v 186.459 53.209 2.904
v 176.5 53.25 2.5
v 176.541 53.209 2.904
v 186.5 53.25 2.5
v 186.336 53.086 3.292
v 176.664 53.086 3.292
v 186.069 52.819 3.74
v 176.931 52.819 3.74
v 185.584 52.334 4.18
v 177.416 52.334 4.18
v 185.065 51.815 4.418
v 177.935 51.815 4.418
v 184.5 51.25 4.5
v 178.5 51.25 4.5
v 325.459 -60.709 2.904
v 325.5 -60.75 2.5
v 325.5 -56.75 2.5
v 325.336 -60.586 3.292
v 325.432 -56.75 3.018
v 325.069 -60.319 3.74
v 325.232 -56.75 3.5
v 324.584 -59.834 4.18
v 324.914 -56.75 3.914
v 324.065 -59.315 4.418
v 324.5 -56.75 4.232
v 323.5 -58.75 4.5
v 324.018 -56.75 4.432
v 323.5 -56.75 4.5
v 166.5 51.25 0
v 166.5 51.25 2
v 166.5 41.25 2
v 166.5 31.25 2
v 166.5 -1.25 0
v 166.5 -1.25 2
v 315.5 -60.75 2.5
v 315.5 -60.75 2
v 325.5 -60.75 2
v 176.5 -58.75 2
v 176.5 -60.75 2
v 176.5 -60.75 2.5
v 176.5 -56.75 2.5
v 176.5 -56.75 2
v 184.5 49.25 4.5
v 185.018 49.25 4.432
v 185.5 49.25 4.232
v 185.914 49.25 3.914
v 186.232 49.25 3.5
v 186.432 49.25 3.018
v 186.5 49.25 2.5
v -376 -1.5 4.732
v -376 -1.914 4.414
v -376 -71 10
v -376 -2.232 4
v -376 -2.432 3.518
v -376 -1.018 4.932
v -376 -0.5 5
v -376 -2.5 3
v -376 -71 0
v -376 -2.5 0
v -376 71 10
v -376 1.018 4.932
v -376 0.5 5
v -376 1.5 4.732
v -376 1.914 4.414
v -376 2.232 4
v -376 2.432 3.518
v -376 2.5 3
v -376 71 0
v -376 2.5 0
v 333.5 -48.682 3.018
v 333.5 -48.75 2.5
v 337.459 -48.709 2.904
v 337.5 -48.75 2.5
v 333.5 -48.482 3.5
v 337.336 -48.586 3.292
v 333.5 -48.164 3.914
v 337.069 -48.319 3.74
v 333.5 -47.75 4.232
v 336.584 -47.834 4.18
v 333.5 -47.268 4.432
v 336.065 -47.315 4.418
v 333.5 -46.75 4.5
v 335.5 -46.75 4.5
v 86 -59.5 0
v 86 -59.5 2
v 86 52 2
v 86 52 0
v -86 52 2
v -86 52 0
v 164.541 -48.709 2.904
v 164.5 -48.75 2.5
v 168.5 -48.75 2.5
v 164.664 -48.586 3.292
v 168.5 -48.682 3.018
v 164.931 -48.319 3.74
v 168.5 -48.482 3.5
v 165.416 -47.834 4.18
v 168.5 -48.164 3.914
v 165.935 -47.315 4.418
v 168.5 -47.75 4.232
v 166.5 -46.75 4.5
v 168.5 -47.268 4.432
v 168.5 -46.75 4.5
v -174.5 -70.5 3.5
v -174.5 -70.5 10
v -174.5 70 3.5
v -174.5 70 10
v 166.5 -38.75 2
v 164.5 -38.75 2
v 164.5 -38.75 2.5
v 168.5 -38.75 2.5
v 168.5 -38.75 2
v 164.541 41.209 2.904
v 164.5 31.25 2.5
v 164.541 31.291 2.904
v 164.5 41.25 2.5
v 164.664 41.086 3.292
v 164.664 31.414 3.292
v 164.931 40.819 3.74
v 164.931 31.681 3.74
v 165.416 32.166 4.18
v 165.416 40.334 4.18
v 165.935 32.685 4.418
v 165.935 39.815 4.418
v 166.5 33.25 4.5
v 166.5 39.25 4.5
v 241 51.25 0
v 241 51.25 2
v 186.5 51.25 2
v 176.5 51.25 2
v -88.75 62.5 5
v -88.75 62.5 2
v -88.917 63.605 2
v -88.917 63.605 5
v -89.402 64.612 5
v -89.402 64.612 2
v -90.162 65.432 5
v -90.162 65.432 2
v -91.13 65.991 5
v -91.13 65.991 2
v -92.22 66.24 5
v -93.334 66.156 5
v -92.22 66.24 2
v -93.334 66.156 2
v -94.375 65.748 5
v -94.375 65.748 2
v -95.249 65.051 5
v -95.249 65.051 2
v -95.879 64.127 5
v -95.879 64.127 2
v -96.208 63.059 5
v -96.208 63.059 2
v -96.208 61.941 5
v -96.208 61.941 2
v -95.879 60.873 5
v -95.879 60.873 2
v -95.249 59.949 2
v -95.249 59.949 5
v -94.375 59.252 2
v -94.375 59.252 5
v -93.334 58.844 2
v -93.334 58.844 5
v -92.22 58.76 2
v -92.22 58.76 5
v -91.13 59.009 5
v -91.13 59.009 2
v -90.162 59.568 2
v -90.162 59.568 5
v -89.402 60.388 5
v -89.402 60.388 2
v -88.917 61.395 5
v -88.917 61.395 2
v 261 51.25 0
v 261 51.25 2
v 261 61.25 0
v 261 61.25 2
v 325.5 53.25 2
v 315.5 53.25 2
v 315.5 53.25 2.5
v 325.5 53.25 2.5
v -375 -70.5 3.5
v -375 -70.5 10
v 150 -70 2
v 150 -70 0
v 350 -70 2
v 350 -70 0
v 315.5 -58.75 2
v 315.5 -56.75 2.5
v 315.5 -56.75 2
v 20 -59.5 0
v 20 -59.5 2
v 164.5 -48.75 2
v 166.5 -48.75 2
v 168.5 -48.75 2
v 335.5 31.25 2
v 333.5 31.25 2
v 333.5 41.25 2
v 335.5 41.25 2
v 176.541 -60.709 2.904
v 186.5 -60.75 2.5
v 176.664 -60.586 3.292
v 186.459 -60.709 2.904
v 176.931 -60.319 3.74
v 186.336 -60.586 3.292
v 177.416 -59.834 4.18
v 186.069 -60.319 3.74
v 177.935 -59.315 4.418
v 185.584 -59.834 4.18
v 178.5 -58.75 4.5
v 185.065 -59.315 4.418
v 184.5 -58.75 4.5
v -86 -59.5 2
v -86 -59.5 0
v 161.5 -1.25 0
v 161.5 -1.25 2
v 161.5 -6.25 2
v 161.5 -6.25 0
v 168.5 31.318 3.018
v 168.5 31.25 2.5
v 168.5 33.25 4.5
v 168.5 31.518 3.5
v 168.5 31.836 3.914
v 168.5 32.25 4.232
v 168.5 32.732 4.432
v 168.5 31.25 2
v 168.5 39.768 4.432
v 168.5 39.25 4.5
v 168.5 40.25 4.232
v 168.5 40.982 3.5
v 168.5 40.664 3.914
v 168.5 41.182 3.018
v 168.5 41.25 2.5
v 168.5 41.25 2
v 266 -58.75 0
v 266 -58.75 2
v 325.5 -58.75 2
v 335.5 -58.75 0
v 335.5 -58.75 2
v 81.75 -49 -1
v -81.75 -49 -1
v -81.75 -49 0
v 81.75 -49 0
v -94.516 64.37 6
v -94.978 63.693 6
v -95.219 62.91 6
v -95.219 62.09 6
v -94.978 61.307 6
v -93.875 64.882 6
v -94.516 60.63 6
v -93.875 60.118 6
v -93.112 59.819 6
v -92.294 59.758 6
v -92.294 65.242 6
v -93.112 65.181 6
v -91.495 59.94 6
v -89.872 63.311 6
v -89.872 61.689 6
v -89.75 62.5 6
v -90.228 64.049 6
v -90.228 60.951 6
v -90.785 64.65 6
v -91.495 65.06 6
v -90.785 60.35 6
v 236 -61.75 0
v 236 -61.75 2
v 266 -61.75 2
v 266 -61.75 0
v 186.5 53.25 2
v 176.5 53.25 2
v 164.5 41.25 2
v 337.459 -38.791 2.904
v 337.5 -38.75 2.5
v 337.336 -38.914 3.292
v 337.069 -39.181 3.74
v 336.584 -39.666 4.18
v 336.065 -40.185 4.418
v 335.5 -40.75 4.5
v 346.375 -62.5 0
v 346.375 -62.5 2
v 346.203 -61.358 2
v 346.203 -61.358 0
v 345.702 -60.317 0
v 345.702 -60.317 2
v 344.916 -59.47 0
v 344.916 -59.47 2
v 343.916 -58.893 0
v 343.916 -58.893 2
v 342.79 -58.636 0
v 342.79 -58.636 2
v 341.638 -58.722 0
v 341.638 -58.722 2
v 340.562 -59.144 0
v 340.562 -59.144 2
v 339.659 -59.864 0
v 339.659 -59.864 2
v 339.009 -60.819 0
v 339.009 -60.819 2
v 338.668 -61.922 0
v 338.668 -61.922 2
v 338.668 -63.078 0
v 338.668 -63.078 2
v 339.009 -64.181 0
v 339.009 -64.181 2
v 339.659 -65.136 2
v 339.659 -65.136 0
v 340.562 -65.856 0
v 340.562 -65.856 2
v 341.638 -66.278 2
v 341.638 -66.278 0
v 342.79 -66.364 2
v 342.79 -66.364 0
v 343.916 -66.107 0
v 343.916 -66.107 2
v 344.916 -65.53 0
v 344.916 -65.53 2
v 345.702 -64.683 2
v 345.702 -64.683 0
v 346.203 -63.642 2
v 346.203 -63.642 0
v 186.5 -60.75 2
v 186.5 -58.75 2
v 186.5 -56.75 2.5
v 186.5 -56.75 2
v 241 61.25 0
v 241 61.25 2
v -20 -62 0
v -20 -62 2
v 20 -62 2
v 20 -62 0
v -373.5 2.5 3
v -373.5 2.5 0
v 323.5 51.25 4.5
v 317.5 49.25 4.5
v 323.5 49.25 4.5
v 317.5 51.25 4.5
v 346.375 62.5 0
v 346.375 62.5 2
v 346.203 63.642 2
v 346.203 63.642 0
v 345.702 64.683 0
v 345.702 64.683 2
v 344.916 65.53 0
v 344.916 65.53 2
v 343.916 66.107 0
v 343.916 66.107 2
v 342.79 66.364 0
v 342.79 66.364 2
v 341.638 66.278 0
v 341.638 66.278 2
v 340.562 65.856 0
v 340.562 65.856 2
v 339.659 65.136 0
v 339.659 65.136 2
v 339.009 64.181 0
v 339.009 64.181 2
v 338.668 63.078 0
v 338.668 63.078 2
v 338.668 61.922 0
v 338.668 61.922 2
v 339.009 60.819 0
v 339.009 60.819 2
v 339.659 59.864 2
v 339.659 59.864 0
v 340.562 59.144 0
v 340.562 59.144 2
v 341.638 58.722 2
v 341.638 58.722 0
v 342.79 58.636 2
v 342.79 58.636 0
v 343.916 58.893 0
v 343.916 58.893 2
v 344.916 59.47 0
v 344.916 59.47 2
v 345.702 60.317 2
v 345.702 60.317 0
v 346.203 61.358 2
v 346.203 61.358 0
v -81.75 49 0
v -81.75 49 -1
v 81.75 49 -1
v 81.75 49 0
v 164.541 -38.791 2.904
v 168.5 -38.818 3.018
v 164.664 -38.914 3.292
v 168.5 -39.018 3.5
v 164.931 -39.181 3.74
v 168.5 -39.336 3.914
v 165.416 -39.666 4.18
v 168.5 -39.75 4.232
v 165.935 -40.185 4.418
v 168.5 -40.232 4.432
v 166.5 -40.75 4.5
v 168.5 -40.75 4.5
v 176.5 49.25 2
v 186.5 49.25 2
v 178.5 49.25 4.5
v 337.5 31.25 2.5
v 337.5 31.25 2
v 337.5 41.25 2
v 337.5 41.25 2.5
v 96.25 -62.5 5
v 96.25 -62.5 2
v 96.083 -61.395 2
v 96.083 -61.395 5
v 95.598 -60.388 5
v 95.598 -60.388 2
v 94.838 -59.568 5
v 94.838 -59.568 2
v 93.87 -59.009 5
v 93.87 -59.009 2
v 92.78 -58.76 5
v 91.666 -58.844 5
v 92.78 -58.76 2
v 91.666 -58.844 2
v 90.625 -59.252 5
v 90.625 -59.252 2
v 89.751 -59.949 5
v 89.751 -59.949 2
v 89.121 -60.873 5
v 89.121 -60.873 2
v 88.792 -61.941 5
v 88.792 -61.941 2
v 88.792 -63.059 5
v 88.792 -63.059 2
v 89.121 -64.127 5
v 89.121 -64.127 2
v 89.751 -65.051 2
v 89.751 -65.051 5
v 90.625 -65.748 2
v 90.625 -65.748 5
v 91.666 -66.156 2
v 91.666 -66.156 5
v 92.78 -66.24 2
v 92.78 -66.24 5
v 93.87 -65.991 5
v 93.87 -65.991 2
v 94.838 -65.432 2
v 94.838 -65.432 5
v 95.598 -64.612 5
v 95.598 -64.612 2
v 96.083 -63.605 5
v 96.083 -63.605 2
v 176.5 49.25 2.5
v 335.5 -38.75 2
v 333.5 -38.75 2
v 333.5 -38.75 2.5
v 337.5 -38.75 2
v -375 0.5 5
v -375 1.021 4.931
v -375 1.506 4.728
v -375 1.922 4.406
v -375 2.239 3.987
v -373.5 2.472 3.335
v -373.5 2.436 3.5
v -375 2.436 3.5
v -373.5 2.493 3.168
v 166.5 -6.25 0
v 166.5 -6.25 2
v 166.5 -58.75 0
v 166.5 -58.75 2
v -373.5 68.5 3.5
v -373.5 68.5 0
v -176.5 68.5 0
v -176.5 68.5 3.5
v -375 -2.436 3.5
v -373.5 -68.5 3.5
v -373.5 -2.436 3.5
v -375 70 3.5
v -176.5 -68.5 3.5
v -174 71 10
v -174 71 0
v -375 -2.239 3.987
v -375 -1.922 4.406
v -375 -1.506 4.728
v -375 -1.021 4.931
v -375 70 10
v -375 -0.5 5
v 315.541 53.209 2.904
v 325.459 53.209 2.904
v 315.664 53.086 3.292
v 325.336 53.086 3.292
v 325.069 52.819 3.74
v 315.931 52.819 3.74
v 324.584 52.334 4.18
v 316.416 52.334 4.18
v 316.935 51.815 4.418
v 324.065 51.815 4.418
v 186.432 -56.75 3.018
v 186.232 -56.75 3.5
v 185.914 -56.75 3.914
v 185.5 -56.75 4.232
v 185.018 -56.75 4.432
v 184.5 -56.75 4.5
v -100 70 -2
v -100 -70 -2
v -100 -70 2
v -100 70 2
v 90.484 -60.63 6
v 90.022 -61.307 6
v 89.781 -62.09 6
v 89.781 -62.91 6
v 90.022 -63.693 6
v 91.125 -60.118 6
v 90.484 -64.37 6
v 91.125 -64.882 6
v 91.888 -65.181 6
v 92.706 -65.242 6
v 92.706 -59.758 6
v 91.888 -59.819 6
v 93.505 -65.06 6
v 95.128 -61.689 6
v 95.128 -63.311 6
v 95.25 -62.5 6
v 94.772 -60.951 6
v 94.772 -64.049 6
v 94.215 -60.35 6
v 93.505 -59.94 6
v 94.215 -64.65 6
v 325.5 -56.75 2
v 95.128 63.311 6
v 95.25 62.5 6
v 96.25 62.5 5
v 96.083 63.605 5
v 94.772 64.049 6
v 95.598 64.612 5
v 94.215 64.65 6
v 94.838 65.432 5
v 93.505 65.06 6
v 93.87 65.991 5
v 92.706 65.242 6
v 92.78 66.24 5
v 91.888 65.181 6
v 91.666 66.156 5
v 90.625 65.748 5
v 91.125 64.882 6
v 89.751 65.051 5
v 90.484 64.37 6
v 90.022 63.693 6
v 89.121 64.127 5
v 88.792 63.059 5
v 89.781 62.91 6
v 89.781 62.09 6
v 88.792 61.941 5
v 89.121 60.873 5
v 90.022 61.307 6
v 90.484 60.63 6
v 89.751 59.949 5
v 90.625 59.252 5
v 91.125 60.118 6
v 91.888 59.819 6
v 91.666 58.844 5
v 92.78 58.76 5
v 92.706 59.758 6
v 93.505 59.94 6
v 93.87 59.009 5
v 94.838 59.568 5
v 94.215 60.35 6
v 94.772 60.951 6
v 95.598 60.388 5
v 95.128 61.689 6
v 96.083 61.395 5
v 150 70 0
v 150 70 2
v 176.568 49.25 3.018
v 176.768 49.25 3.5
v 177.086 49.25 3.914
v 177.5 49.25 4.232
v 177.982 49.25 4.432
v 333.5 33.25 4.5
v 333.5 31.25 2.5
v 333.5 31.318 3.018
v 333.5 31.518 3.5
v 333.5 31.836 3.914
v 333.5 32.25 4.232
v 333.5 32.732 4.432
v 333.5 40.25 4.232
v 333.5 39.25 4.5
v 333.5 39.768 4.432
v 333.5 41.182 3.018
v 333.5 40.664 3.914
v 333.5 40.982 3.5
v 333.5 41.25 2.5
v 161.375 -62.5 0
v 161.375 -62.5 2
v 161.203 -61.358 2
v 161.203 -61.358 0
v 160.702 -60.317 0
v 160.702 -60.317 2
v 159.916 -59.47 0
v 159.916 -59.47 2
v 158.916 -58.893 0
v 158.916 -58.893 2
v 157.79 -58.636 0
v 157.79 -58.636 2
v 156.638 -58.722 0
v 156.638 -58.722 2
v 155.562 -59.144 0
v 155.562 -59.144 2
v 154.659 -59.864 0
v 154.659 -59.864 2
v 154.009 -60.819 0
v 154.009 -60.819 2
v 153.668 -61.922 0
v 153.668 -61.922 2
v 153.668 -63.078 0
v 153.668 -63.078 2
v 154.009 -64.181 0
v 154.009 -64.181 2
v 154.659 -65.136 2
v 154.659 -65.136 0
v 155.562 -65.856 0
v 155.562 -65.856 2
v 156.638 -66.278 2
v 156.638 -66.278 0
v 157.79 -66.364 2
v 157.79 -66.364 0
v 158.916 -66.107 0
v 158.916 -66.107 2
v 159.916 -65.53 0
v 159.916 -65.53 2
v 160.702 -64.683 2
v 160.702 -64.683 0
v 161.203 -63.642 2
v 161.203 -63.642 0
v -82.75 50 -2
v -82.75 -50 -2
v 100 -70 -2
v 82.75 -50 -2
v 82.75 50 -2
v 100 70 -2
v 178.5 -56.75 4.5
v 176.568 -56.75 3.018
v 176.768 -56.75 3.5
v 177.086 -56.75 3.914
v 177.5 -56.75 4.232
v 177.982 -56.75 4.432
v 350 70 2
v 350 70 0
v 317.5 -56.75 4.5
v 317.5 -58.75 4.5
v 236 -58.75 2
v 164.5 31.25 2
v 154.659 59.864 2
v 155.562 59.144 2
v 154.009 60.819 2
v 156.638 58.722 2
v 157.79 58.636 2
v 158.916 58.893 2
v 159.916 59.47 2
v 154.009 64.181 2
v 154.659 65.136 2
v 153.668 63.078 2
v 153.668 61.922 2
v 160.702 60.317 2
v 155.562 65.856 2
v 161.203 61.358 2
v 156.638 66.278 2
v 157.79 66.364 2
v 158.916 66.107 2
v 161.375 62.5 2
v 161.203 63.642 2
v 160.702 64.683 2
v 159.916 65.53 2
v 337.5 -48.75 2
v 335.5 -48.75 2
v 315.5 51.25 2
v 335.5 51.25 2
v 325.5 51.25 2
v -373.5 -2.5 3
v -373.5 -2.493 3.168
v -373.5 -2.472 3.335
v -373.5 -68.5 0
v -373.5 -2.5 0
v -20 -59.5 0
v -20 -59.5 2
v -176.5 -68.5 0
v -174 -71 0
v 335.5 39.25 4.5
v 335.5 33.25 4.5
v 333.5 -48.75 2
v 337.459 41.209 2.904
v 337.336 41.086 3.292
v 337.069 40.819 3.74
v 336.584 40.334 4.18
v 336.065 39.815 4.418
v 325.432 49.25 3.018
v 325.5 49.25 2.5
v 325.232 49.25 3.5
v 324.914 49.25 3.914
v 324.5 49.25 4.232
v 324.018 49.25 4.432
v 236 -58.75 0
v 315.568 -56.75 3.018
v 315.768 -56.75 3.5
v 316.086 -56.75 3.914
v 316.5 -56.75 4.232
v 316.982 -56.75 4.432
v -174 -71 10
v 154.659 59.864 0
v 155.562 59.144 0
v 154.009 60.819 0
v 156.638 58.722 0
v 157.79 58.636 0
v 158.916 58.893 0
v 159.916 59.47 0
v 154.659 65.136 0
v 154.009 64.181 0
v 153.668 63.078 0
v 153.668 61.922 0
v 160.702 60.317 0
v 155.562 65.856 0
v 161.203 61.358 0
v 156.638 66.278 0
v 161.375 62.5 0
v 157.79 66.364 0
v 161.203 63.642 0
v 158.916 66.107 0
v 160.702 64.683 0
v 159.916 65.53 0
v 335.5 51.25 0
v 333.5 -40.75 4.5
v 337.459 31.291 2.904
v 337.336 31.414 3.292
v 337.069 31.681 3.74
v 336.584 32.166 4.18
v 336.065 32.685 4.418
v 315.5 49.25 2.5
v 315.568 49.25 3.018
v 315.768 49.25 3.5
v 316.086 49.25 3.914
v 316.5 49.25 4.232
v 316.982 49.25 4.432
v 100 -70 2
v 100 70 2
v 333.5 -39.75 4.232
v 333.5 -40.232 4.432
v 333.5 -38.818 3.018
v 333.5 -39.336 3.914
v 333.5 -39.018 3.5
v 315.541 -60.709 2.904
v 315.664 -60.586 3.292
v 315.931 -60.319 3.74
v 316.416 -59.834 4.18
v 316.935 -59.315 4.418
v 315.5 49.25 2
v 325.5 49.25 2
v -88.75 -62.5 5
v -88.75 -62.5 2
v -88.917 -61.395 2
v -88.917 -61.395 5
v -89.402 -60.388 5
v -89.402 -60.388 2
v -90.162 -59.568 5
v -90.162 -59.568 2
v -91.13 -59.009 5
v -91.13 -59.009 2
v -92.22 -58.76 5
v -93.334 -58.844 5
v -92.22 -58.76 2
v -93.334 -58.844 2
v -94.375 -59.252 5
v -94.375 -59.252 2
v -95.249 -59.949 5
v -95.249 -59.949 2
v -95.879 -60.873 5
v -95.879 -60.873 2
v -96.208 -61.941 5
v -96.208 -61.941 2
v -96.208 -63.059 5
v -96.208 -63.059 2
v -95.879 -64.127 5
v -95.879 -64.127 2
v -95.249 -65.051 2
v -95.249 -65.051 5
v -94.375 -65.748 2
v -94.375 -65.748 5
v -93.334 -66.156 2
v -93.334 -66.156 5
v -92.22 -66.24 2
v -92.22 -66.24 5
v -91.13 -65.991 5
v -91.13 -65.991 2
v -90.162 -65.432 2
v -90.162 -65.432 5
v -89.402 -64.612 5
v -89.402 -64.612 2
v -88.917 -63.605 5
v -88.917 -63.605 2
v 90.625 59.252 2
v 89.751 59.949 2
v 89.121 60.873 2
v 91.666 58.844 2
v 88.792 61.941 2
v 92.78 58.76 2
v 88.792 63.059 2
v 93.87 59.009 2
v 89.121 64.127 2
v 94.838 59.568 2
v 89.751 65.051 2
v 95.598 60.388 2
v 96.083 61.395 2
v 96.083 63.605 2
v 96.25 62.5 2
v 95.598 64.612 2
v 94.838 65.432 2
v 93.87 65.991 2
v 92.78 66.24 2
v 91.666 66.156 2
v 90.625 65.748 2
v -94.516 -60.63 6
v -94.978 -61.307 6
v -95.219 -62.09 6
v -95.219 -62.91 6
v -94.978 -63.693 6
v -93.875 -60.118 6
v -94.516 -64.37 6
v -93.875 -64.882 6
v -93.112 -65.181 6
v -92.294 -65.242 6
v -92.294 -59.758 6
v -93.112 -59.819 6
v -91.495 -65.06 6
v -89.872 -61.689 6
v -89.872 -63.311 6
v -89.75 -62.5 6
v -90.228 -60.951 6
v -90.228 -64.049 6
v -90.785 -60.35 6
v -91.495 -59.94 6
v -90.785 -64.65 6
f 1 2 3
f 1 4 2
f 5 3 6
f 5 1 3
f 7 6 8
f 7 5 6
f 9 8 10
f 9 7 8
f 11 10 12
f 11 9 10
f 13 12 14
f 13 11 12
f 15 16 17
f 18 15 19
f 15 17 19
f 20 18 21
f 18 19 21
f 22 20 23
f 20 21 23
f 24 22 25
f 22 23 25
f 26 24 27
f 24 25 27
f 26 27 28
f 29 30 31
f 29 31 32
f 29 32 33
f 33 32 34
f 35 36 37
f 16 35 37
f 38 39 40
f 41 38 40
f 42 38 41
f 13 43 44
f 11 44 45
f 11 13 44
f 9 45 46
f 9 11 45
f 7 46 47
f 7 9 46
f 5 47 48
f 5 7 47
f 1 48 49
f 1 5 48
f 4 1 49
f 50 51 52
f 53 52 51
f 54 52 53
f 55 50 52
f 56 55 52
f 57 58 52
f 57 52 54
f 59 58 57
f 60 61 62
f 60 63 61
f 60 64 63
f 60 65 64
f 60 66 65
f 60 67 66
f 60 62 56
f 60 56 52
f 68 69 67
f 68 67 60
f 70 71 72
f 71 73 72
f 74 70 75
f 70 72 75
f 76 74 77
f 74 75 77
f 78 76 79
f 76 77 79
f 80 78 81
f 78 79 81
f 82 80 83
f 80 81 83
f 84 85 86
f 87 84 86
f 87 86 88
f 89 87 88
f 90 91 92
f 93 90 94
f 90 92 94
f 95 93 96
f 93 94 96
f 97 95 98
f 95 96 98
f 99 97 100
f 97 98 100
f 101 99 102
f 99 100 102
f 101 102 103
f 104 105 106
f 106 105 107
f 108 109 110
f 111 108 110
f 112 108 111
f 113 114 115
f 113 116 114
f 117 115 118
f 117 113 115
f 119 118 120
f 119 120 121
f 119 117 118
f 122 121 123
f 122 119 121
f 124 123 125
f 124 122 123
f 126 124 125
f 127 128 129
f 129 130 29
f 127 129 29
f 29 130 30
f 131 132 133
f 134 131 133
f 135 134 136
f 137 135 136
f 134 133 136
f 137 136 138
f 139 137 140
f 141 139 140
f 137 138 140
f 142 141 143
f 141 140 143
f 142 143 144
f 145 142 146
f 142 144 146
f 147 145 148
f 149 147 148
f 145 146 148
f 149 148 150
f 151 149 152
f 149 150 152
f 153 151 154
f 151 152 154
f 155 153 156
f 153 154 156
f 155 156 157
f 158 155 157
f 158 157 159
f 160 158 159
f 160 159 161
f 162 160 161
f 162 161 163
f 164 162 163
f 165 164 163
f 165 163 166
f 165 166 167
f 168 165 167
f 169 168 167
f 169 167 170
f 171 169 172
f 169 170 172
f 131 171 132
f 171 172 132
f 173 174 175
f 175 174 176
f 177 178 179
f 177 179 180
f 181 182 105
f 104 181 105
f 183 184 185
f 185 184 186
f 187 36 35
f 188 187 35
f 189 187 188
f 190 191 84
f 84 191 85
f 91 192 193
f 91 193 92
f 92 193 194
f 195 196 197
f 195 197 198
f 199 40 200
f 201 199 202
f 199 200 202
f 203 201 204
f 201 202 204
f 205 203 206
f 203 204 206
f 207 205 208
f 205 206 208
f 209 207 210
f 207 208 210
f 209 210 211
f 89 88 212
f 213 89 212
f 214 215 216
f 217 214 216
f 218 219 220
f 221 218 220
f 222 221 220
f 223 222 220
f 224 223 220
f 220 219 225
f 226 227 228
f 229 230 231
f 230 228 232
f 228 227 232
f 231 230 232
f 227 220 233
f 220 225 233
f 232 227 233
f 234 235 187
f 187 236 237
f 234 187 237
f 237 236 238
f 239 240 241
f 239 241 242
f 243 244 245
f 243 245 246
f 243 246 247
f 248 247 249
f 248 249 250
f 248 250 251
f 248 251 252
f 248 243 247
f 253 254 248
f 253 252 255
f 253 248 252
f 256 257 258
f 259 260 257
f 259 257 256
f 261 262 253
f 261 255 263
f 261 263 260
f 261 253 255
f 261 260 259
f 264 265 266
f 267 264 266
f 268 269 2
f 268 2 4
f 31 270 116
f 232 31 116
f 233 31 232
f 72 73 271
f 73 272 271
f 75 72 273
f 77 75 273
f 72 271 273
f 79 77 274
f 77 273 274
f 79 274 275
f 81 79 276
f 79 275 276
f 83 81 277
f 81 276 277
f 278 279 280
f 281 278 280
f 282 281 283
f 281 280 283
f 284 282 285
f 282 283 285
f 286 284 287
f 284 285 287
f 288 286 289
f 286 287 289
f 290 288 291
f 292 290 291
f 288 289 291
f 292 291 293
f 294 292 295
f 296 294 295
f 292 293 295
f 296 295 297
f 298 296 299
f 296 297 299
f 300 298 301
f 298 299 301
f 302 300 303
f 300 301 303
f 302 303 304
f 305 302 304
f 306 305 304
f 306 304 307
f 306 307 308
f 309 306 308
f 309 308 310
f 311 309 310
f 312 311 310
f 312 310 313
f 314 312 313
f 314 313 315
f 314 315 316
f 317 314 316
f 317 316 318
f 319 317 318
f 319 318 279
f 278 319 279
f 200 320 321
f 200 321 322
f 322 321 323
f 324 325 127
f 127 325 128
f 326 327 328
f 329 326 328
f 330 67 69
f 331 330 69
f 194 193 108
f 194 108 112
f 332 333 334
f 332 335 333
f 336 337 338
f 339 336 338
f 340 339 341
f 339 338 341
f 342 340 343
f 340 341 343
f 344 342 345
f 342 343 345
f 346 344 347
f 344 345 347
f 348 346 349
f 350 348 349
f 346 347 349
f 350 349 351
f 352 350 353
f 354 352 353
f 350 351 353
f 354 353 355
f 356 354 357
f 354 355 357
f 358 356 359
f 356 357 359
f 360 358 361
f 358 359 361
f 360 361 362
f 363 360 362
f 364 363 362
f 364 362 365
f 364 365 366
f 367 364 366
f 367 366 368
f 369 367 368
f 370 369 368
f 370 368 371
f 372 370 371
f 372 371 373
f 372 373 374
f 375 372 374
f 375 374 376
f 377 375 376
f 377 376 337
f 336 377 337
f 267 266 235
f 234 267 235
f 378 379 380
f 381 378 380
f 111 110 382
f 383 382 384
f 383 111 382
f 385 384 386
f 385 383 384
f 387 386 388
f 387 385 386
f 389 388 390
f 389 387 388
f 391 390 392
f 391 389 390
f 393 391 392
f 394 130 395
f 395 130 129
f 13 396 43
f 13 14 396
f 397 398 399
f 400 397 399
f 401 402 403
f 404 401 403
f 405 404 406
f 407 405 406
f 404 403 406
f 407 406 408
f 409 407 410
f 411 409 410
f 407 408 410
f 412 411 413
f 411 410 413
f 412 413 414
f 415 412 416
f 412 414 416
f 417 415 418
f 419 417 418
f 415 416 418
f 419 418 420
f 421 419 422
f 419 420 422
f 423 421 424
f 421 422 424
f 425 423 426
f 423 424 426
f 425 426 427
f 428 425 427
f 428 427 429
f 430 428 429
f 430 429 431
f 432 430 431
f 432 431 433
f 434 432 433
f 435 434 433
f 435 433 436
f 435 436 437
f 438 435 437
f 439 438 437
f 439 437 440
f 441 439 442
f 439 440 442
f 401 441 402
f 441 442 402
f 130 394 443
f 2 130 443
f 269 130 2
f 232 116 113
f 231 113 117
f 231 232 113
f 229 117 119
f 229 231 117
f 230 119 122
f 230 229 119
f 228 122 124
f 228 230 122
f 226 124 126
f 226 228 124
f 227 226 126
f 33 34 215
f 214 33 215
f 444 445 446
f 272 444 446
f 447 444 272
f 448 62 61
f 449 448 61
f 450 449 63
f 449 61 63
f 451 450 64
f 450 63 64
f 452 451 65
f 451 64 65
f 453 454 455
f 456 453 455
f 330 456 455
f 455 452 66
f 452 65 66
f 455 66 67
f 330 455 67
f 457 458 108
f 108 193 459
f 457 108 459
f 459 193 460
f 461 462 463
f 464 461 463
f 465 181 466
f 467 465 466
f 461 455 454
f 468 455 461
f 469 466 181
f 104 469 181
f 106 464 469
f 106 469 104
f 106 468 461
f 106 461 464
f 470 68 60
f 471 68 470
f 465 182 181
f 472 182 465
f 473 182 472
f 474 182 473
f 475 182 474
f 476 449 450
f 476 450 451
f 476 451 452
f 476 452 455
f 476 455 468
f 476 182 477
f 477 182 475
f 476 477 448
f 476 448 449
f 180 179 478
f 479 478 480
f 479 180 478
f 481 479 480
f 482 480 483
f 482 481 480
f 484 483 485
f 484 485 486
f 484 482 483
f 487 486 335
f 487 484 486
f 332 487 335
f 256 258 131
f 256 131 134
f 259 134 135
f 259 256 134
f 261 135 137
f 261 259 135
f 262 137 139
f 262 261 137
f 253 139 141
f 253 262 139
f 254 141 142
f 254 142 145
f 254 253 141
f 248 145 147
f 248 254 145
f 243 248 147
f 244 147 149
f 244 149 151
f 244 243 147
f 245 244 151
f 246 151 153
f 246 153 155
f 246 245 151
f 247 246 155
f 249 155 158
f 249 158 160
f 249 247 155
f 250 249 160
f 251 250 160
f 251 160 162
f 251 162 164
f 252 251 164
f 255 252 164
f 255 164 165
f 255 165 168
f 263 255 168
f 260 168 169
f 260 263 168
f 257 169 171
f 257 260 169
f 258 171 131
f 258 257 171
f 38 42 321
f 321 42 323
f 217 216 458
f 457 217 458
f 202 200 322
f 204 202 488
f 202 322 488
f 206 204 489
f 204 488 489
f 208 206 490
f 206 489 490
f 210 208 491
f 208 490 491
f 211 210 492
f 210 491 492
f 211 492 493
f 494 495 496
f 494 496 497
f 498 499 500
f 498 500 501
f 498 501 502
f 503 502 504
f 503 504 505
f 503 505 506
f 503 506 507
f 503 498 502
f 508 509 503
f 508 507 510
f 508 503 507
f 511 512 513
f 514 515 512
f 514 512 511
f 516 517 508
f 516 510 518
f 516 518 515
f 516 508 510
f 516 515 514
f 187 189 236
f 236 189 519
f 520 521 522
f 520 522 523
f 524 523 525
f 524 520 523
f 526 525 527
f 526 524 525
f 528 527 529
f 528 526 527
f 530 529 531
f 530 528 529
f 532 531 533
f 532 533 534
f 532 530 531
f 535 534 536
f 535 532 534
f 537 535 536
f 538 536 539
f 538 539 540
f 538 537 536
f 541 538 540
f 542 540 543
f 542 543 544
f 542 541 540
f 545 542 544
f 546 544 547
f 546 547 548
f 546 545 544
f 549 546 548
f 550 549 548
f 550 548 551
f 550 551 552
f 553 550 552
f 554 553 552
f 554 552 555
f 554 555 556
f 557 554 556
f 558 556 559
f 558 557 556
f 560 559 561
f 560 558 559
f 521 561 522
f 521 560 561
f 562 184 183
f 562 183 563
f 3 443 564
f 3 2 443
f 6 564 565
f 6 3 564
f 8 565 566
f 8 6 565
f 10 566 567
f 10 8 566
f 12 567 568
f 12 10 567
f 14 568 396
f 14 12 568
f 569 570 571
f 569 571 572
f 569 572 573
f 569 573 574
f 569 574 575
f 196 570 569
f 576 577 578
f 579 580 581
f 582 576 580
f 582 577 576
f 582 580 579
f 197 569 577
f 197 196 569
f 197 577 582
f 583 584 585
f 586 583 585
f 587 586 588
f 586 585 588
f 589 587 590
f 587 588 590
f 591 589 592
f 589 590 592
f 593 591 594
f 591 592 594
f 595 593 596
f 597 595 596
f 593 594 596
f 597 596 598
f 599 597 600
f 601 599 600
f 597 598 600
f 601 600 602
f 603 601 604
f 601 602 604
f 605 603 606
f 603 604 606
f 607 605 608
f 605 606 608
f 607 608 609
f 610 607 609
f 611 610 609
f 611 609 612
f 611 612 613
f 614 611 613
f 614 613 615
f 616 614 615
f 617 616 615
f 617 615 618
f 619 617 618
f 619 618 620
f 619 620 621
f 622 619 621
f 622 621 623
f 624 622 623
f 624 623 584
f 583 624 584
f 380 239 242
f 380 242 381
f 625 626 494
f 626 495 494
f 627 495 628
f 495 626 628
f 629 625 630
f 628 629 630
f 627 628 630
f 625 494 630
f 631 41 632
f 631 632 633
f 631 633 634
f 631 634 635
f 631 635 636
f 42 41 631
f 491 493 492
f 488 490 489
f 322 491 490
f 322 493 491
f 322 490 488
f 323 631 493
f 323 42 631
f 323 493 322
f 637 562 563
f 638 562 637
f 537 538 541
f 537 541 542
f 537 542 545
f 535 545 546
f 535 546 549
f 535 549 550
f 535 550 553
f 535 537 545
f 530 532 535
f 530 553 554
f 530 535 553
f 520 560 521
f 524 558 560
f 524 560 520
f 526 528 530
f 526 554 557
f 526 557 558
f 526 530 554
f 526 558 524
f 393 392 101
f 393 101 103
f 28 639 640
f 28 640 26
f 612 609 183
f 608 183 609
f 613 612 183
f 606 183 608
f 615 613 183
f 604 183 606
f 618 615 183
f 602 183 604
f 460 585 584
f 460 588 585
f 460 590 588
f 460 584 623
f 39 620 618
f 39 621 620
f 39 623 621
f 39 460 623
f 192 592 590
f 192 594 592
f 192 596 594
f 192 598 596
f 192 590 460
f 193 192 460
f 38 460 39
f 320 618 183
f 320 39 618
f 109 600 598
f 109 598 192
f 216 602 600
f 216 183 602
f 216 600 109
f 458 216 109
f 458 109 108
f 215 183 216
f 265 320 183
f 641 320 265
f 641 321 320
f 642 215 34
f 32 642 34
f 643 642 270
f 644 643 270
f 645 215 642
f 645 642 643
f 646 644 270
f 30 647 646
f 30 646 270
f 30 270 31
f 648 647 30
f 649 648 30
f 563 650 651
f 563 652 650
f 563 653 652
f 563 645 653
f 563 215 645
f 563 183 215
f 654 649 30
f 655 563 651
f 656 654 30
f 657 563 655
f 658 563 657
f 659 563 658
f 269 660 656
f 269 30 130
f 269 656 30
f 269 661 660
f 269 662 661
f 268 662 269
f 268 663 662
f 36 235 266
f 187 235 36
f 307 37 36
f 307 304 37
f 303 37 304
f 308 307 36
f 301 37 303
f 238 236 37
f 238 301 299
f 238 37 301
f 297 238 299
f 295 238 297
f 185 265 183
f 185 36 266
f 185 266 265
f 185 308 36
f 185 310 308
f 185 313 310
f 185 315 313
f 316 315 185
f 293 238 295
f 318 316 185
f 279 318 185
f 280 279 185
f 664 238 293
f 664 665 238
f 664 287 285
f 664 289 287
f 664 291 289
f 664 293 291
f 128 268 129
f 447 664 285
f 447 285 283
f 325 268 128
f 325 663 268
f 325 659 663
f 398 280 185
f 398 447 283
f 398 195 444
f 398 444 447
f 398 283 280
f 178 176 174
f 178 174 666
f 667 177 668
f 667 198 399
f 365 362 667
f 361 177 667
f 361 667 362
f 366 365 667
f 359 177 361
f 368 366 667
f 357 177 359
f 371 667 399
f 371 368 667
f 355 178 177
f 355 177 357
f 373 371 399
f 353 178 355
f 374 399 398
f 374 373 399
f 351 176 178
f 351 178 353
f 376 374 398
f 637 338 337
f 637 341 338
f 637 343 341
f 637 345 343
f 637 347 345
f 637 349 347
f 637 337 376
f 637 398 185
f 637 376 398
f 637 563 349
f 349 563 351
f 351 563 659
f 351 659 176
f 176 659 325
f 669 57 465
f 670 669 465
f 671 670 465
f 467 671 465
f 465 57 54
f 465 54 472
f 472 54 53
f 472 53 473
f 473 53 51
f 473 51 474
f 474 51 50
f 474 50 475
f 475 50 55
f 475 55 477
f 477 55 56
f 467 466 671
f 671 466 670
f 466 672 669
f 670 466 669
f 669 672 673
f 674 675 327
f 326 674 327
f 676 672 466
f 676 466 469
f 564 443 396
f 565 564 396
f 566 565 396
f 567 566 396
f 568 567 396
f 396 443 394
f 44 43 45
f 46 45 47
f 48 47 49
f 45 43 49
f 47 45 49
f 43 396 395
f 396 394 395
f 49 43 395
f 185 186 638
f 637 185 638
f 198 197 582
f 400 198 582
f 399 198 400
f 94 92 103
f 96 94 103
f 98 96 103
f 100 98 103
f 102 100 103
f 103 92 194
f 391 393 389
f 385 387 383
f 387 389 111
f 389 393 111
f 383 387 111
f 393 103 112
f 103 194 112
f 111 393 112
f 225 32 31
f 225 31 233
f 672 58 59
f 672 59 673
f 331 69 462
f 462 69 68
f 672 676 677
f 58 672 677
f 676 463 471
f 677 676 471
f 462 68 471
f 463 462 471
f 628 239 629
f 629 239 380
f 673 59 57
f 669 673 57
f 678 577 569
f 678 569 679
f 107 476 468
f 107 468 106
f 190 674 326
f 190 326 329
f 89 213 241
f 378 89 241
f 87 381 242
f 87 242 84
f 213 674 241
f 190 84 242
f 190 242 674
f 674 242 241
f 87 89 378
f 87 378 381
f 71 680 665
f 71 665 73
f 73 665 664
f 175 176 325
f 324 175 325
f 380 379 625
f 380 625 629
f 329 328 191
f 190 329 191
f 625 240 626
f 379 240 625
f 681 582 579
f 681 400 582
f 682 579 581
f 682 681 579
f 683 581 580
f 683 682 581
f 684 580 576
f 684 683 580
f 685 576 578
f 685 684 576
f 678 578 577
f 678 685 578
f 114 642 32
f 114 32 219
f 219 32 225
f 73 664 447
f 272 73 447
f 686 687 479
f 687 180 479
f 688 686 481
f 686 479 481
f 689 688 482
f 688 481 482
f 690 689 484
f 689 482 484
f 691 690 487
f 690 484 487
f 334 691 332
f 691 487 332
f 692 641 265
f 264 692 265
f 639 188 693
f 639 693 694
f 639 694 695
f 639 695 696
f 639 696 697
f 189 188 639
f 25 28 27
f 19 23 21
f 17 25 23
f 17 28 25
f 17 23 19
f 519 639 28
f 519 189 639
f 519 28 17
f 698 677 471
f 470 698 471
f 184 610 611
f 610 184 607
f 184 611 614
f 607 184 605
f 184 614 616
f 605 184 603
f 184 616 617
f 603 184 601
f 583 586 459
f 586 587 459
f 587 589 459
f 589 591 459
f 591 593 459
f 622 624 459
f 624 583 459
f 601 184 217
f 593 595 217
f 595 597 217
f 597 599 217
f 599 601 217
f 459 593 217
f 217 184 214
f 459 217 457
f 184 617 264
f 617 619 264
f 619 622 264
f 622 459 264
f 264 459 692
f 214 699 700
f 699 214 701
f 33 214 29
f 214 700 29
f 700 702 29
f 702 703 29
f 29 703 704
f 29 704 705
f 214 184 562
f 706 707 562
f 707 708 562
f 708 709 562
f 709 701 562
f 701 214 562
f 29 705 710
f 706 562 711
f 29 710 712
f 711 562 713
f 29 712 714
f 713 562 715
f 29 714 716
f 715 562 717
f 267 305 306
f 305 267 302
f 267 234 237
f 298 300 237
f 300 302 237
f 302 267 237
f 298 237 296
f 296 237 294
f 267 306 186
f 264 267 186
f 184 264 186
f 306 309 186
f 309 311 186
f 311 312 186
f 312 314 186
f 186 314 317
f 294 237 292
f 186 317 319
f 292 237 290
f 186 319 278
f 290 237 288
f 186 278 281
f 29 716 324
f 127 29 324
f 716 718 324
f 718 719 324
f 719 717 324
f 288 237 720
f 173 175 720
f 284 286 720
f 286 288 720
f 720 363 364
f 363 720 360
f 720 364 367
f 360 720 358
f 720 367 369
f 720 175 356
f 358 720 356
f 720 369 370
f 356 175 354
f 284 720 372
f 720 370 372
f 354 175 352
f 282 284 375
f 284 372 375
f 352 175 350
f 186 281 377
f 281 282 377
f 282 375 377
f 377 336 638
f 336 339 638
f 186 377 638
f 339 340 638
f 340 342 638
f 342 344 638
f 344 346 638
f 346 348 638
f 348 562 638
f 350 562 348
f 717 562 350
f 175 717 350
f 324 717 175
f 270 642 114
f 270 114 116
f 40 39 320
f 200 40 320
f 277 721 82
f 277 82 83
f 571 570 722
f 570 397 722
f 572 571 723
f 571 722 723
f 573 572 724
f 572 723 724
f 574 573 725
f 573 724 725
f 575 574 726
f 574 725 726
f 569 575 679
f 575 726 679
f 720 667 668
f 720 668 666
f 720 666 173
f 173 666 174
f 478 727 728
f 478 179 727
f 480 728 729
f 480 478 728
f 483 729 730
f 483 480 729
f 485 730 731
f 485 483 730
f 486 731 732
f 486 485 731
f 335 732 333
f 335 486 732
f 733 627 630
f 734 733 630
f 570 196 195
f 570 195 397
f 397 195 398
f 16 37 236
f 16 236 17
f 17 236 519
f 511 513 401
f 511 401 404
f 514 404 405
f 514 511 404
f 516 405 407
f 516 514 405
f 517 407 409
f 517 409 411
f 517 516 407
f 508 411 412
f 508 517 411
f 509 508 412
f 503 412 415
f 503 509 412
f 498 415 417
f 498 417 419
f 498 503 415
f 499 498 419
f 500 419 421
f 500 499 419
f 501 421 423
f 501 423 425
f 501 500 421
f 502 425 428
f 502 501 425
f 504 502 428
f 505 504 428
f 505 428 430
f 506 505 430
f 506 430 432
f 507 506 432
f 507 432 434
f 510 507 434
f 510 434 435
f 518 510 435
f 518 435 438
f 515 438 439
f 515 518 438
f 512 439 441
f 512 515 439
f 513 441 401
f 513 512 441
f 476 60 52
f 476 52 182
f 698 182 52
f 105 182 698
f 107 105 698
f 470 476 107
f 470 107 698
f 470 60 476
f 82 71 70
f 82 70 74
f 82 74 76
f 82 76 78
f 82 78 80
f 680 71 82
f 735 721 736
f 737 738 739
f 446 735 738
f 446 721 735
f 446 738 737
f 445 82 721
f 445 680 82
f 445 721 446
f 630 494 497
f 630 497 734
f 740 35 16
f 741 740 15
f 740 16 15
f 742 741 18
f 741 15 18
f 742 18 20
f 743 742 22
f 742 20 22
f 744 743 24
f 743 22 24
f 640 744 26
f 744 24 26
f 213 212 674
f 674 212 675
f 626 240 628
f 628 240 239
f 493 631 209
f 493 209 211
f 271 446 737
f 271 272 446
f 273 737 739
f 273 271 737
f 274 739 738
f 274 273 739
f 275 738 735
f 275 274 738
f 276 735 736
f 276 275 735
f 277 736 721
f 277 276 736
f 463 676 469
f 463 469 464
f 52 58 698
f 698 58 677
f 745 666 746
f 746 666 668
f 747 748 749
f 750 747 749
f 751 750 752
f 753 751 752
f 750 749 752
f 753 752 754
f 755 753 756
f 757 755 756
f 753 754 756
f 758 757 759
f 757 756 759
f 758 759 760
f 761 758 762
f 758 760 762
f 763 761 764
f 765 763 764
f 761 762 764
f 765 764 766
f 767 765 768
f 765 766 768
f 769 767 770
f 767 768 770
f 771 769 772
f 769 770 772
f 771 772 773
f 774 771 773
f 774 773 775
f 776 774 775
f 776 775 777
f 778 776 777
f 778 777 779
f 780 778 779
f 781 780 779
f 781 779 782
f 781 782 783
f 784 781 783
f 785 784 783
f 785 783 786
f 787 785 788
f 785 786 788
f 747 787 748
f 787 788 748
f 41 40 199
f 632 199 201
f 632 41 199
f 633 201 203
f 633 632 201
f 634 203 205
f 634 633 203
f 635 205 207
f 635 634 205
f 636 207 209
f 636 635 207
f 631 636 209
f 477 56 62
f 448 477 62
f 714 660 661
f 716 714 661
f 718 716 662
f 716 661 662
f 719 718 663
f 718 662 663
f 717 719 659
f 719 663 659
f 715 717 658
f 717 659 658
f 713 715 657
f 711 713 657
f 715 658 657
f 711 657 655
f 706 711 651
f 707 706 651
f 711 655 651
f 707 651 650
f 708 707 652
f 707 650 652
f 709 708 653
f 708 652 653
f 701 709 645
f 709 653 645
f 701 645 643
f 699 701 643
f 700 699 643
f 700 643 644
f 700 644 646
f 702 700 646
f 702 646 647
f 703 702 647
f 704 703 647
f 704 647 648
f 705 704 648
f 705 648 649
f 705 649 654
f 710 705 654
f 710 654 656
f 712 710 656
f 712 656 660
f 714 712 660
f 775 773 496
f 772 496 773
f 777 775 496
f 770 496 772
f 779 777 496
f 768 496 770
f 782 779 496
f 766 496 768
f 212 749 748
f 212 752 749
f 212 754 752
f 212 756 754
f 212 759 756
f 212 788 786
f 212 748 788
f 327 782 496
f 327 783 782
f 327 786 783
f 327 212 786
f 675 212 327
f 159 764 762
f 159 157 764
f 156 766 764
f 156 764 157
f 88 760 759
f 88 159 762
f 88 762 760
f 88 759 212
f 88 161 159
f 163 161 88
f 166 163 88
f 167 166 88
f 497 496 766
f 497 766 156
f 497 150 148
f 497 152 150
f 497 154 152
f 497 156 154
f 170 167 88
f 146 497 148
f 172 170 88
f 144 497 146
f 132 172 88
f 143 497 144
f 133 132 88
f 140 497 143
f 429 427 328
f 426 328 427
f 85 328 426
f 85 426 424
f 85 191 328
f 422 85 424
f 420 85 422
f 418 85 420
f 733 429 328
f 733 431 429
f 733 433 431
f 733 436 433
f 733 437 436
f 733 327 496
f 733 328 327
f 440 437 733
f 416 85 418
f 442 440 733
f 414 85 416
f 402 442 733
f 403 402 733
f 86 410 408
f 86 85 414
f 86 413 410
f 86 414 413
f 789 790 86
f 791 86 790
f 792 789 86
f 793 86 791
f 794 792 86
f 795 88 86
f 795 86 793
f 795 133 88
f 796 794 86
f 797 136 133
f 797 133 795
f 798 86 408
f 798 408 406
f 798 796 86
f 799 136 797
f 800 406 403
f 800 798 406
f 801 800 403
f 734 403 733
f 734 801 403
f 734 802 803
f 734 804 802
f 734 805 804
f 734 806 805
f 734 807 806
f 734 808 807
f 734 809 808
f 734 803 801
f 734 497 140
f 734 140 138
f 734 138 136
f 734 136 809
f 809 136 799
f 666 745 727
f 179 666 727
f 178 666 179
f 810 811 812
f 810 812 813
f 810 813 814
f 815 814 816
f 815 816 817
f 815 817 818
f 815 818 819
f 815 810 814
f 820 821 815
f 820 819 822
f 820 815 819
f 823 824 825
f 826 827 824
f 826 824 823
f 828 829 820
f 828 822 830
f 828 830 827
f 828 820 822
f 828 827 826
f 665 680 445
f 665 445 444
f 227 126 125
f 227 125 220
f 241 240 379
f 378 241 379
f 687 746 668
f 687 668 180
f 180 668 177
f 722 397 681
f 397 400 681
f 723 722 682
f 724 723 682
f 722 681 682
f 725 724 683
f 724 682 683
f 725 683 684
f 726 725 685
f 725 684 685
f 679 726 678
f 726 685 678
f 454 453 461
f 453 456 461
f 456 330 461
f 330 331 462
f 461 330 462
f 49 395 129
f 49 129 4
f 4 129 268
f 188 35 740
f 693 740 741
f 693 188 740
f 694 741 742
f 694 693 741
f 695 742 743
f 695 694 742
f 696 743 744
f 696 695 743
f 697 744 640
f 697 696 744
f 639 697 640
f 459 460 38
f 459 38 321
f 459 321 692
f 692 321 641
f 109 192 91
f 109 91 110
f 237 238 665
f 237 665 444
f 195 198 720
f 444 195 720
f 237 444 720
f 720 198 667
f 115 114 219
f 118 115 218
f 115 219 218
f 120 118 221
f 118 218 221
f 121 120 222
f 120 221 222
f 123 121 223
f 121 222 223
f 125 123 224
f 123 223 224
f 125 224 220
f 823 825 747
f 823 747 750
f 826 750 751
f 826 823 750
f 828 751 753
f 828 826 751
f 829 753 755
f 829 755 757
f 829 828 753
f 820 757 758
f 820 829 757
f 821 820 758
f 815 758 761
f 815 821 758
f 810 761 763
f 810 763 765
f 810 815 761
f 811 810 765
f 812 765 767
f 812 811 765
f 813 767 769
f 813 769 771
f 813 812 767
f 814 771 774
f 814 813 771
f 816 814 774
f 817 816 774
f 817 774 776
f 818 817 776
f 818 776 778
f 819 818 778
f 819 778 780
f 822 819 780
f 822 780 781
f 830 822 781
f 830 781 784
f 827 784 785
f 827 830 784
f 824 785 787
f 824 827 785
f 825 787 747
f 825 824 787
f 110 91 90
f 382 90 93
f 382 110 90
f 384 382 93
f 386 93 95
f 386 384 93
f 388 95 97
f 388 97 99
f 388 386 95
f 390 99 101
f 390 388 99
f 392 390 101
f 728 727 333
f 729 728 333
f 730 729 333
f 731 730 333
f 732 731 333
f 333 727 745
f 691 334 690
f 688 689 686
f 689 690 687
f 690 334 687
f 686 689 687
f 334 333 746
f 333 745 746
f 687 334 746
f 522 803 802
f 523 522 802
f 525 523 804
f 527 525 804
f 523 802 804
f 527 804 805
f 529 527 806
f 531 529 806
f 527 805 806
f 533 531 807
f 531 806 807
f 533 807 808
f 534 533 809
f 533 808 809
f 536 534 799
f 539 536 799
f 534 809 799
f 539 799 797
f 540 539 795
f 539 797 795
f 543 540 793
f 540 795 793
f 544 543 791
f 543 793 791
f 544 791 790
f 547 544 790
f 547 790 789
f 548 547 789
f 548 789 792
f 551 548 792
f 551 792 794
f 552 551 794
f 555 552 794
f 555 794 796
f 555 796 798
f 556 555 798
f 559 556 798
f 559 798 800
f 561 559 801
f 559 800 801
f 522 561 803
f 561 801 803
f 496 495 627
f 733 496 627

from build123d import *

# Parameters (mm, degrees)
SKETCH_W        = 200
SKETCH_H        = 140
SKETCH_W_2      = 163.5
SKETCH_H_2      = 98
PAD_DEPTH       = 4
POCKET_DEPTH    = 2
SKETCH004_R     = 3.75
PAD001_DEPTH    = 4
CHAMFER_SIZE    = 1
SKETCH005_W     = 200
SKETCH005_H     = 140
PAD002_DEPTH    = 2
POCKET001_DEPTH = 2.001
SKETCH007_R     = 3.875
POCKET002_DEPTH = 2.001
SKETCH008_W     = 10
SKETCH008_H     = 4
SKETCH008_W_2   = 4
SKETCH008_H_2   = 10
PAD003_DEPTH    = 2.5
FILLET_R        = 2
SKETCH009_W     = 202
SKETCH009_H     = 142
SKETCH009_W_2   = 197
SKETCH009_H_2   = 137
PAD004_DEPTH    = 10
SKETCH010_W     = 200.5
SKETCH010_H     = 140.5
SKETCH010_W_2   = 197
SKETCH010_H_2   = 137
POCKET003_DEPTH = 6.5
POCKET004_DEPTH = 2.5


with BuildPart() as framefront:
    # Sketch (on DatumPlane) → Pad (new body)
    with BuildSketch(Plane.XY.offset(-2)):
        Rectangle(SKETCH_W, SKETCH_H)
        Rectangle(SKETCH_W_2, SKETCH_H_2, mode=Mode.SUBTRACT)
    extrude(amount=PAD_DEPTH)

    # Sketch003 (on Face10 of Pad) → Pocket (cut)
    with BuildSketch(Plane.XY.offset(2)):
        Polygon((-86, 52), (-86, -59.5), (-20, -59.5), (-20, -62), (20, -62), (20, -59.5), (86, -59.5), (86, 52), align=None)
    extrude(amount=-POCKET_DEPTH, mode=Mode.SUBTRACT)

    # Sketch004 (on Face5 of Pocket) → Pad001 (join)
    with BuildSketch(Plane.XY.offset(2)):
        with Locations((-92.5, 62.5)):
            Circle(SKETCH004_R)
        with Locations((92.5, 62.5)):
            Circle(SKETCH004_R)
        with Locations((92.5, -62.5)):
            Circle(SKETCH004_R)
        with Locations((-92.5, -62.5)):
            Circle(SKETCH004_R)
    extrude(amount=PAD001_DEPTH)

    # Chamfer
    chamfer_edges = [framefront.edges().sort_by_distance(p)[0] for p in [
        (0, 49, -2),
        (-81.75, 0, -2),
        (81.75, 0, -2),
        (0, -49, -2),
        (-96.25, 62.5, 6),
        (-96.25, -62.5, 6),
        (88.75, -62.5, 6),
        (88.75, 62.5, 6),
    ]]
    chamfer(chamfer_edges, length=CHAMFER_SIZE)


with BuildPart() as frameback:
    # Sketch005 → Pad002 (new body)
    with BuildSketch(Plane.XY):
        with Locations((250, 0)):
            Rectangle(SKETCH005_W, SKETCH005_H)
    extrude(amount=PAD002_DEPTH)

    # Sketch006 (on Face6 of Pad002) → Pocket001 (cut, through all)
    with BuildSketch(Plane.XY.offset(2)):
        Polygon((335.5, -58.75), (335.5, 51.25), (261, 51.25), (261, 61.25), (241, 61.25), (241, 51.25), (166.5, 51.25), (166.5, -1.25), (161.5, -1.25), (161.5, -6.25), (166.5, -6.25), (166.5, -58.75), (236, -58.75), (236, -61.75), (266, -61.75), (266, -58.75), align=None)
    extrude(amount=-POCKET001_DEPTH, mode=Mode.SUBTRACT)

    # Sketch007 (on Face5 of Pocket001) → Pocket002 (cut, through all)
    with BuildSketch(Plane.XY.offset(2)):
        with Locations((157.5, 62.5)):
            Circle(SKETCH007_R)
        with Locations((342.5, 62.5)):
            Circle(SKETCH007_R)
        with Locations((342.5, -62.5)):
            Circle(SKETCH007_R)
        with Locations((157.5, -62.5)):
            Circle(SKETCH007_R)
    extrude(amount=-POCKET002_DEPTH, mode=Mode.SUBTRACT)

    # Sketch008 (on Face5 of Pocket002) → Pad003 (join)
    with BuildSketch(Plane.XY.offset(2)):
        with Locations((181.5, 51.25)):
            Rectangle(SKETCH008_W, SKETCH008_H)
        with Locations((166.5, 36.25)):
            Rectangle(SKETCH008_W_2, SKETCH008_H_2)
        with Locations((166.5, -43.75)):
            Rectangle(SKETCH008_W_2, SKETCH008_H_2)
        with Locations((181.5, -58.75)):
            Rectangle(SKETCH008_W, SKETCH008_H)
        with Locations((320.5, -58.75)):
            Rectangle(SKETCH008_W, SKETCH008_H)
        with Locations((335.5, -43.75)):
            Rectangle(SKETCH008_W_2, SKETCH008_H_2)
        with Locations((335.5, 36.25)):
            Rectangle(SKETCH008_W_2, SKETCH008_H_2)
        with Locations((320.5, 51.25)):
            Rectangle(SKETCH008_W, SKETCH008_H)
    extrude(amount=PAD003_DEPTH)

    # Fillet
    fillet_edges = [frameback.edges().sort_by_distance(p)[0] for p in [
        (181.5, 53.25, 4.5),
        (176.5, 51.25, 4.5),
        (186.5, 51.25, 4.5),
        (315.5, 51.25, 4.5),
        (320.5, 53.25, 4.5),
        (325.5, 51.25, 4.5),
        (335.5, 41.25, 4.5),
        (337.5, 36.25, 4.5),
        (335.5, 31.25, 4.5),
        (335.5, -38.75, 4.5),
        (337.5, -43.75, 4.5),
        (335.5, -48.75, 4.5),
        (325.5, -58.75, 4.5),
        (320.5, -60.75, 4.5),
        (315.5, -58.75, 4.5),
        (186.5, -58.75, 4.5),
        (181.5, -60.75, 4.5),
        (176.5, -58.75, 4.5),
        (166.5, -48.75, 4.5),
        (164.5, -43.75, 4.5),
        (166.5, -38.75, 4.5),
        (166.5, 31.25, 4.5),
        (164.5, 36.25, 4.5),
        (166.5, 41.25, 4.5),
    ]]
    fillet(fillet_edges, radius=FILLET_R)


with BuildPart() as framesurround:
    # Sketch009 → Pad004 (new body)
    with BuildSketch(Plane.XY):
        with Locations((-275, 0)):
            Rectangle(SKETCH009_W, SKETCH009_H)
        with Locations((-275, 0)):
            Rectangle(SKETCH009_W_2, SKETCH009_H_2, mode=Mode.SUBTRACT)
    extrude(amount=PAD004_DEPTH)

    # Sketch010 (on Face10 of Pad004) → Pocket003 (cut)
    with BuildSketch(Plane.XY.offset(10)):
        with Locations((-274.75, -0.25)):
            Rectangle(SKETCH010_W, SKETCH010_H)
        with Locations((-275, 0)):
            Rectangle(SKETCH010_W_2, SKETCH010_H_2, mode=Mode.SUBTRACT)
    extrude(amount=-POCKET003_DEPTH, mode=Mode.SUBTRACT)

    # Sketch011 (on Face1 of Pocket003) → Pocket004 (cut)
    with BuildSketch(Plane(origin=(-376, 0, 0), x_dir=(0, -1, 0), z_dir=(-1, 0, 0))):
        with BuildLine():
            Line((-2.5, 3), (-2.5, 0))
            Line((-2.5, 0), (2.5, 0))
            Line((2.5, 0), (2.5, 3))
            ThreePointArc((2.5, 3), (1.914214, 4.414214), (0.5, 5))
            Line((0.5, 5), (-0.5, 5))
            ThreePointArc((-0.5, 5), (-1.914214, 4.414214), (-2.5, 3))
        make_face()
    extrude(amount=-POCKET004_DEPTH, mode=Mode.SUBTRACT)


solid = Compound([framefront.part, frameback.part, framesurround.part])
